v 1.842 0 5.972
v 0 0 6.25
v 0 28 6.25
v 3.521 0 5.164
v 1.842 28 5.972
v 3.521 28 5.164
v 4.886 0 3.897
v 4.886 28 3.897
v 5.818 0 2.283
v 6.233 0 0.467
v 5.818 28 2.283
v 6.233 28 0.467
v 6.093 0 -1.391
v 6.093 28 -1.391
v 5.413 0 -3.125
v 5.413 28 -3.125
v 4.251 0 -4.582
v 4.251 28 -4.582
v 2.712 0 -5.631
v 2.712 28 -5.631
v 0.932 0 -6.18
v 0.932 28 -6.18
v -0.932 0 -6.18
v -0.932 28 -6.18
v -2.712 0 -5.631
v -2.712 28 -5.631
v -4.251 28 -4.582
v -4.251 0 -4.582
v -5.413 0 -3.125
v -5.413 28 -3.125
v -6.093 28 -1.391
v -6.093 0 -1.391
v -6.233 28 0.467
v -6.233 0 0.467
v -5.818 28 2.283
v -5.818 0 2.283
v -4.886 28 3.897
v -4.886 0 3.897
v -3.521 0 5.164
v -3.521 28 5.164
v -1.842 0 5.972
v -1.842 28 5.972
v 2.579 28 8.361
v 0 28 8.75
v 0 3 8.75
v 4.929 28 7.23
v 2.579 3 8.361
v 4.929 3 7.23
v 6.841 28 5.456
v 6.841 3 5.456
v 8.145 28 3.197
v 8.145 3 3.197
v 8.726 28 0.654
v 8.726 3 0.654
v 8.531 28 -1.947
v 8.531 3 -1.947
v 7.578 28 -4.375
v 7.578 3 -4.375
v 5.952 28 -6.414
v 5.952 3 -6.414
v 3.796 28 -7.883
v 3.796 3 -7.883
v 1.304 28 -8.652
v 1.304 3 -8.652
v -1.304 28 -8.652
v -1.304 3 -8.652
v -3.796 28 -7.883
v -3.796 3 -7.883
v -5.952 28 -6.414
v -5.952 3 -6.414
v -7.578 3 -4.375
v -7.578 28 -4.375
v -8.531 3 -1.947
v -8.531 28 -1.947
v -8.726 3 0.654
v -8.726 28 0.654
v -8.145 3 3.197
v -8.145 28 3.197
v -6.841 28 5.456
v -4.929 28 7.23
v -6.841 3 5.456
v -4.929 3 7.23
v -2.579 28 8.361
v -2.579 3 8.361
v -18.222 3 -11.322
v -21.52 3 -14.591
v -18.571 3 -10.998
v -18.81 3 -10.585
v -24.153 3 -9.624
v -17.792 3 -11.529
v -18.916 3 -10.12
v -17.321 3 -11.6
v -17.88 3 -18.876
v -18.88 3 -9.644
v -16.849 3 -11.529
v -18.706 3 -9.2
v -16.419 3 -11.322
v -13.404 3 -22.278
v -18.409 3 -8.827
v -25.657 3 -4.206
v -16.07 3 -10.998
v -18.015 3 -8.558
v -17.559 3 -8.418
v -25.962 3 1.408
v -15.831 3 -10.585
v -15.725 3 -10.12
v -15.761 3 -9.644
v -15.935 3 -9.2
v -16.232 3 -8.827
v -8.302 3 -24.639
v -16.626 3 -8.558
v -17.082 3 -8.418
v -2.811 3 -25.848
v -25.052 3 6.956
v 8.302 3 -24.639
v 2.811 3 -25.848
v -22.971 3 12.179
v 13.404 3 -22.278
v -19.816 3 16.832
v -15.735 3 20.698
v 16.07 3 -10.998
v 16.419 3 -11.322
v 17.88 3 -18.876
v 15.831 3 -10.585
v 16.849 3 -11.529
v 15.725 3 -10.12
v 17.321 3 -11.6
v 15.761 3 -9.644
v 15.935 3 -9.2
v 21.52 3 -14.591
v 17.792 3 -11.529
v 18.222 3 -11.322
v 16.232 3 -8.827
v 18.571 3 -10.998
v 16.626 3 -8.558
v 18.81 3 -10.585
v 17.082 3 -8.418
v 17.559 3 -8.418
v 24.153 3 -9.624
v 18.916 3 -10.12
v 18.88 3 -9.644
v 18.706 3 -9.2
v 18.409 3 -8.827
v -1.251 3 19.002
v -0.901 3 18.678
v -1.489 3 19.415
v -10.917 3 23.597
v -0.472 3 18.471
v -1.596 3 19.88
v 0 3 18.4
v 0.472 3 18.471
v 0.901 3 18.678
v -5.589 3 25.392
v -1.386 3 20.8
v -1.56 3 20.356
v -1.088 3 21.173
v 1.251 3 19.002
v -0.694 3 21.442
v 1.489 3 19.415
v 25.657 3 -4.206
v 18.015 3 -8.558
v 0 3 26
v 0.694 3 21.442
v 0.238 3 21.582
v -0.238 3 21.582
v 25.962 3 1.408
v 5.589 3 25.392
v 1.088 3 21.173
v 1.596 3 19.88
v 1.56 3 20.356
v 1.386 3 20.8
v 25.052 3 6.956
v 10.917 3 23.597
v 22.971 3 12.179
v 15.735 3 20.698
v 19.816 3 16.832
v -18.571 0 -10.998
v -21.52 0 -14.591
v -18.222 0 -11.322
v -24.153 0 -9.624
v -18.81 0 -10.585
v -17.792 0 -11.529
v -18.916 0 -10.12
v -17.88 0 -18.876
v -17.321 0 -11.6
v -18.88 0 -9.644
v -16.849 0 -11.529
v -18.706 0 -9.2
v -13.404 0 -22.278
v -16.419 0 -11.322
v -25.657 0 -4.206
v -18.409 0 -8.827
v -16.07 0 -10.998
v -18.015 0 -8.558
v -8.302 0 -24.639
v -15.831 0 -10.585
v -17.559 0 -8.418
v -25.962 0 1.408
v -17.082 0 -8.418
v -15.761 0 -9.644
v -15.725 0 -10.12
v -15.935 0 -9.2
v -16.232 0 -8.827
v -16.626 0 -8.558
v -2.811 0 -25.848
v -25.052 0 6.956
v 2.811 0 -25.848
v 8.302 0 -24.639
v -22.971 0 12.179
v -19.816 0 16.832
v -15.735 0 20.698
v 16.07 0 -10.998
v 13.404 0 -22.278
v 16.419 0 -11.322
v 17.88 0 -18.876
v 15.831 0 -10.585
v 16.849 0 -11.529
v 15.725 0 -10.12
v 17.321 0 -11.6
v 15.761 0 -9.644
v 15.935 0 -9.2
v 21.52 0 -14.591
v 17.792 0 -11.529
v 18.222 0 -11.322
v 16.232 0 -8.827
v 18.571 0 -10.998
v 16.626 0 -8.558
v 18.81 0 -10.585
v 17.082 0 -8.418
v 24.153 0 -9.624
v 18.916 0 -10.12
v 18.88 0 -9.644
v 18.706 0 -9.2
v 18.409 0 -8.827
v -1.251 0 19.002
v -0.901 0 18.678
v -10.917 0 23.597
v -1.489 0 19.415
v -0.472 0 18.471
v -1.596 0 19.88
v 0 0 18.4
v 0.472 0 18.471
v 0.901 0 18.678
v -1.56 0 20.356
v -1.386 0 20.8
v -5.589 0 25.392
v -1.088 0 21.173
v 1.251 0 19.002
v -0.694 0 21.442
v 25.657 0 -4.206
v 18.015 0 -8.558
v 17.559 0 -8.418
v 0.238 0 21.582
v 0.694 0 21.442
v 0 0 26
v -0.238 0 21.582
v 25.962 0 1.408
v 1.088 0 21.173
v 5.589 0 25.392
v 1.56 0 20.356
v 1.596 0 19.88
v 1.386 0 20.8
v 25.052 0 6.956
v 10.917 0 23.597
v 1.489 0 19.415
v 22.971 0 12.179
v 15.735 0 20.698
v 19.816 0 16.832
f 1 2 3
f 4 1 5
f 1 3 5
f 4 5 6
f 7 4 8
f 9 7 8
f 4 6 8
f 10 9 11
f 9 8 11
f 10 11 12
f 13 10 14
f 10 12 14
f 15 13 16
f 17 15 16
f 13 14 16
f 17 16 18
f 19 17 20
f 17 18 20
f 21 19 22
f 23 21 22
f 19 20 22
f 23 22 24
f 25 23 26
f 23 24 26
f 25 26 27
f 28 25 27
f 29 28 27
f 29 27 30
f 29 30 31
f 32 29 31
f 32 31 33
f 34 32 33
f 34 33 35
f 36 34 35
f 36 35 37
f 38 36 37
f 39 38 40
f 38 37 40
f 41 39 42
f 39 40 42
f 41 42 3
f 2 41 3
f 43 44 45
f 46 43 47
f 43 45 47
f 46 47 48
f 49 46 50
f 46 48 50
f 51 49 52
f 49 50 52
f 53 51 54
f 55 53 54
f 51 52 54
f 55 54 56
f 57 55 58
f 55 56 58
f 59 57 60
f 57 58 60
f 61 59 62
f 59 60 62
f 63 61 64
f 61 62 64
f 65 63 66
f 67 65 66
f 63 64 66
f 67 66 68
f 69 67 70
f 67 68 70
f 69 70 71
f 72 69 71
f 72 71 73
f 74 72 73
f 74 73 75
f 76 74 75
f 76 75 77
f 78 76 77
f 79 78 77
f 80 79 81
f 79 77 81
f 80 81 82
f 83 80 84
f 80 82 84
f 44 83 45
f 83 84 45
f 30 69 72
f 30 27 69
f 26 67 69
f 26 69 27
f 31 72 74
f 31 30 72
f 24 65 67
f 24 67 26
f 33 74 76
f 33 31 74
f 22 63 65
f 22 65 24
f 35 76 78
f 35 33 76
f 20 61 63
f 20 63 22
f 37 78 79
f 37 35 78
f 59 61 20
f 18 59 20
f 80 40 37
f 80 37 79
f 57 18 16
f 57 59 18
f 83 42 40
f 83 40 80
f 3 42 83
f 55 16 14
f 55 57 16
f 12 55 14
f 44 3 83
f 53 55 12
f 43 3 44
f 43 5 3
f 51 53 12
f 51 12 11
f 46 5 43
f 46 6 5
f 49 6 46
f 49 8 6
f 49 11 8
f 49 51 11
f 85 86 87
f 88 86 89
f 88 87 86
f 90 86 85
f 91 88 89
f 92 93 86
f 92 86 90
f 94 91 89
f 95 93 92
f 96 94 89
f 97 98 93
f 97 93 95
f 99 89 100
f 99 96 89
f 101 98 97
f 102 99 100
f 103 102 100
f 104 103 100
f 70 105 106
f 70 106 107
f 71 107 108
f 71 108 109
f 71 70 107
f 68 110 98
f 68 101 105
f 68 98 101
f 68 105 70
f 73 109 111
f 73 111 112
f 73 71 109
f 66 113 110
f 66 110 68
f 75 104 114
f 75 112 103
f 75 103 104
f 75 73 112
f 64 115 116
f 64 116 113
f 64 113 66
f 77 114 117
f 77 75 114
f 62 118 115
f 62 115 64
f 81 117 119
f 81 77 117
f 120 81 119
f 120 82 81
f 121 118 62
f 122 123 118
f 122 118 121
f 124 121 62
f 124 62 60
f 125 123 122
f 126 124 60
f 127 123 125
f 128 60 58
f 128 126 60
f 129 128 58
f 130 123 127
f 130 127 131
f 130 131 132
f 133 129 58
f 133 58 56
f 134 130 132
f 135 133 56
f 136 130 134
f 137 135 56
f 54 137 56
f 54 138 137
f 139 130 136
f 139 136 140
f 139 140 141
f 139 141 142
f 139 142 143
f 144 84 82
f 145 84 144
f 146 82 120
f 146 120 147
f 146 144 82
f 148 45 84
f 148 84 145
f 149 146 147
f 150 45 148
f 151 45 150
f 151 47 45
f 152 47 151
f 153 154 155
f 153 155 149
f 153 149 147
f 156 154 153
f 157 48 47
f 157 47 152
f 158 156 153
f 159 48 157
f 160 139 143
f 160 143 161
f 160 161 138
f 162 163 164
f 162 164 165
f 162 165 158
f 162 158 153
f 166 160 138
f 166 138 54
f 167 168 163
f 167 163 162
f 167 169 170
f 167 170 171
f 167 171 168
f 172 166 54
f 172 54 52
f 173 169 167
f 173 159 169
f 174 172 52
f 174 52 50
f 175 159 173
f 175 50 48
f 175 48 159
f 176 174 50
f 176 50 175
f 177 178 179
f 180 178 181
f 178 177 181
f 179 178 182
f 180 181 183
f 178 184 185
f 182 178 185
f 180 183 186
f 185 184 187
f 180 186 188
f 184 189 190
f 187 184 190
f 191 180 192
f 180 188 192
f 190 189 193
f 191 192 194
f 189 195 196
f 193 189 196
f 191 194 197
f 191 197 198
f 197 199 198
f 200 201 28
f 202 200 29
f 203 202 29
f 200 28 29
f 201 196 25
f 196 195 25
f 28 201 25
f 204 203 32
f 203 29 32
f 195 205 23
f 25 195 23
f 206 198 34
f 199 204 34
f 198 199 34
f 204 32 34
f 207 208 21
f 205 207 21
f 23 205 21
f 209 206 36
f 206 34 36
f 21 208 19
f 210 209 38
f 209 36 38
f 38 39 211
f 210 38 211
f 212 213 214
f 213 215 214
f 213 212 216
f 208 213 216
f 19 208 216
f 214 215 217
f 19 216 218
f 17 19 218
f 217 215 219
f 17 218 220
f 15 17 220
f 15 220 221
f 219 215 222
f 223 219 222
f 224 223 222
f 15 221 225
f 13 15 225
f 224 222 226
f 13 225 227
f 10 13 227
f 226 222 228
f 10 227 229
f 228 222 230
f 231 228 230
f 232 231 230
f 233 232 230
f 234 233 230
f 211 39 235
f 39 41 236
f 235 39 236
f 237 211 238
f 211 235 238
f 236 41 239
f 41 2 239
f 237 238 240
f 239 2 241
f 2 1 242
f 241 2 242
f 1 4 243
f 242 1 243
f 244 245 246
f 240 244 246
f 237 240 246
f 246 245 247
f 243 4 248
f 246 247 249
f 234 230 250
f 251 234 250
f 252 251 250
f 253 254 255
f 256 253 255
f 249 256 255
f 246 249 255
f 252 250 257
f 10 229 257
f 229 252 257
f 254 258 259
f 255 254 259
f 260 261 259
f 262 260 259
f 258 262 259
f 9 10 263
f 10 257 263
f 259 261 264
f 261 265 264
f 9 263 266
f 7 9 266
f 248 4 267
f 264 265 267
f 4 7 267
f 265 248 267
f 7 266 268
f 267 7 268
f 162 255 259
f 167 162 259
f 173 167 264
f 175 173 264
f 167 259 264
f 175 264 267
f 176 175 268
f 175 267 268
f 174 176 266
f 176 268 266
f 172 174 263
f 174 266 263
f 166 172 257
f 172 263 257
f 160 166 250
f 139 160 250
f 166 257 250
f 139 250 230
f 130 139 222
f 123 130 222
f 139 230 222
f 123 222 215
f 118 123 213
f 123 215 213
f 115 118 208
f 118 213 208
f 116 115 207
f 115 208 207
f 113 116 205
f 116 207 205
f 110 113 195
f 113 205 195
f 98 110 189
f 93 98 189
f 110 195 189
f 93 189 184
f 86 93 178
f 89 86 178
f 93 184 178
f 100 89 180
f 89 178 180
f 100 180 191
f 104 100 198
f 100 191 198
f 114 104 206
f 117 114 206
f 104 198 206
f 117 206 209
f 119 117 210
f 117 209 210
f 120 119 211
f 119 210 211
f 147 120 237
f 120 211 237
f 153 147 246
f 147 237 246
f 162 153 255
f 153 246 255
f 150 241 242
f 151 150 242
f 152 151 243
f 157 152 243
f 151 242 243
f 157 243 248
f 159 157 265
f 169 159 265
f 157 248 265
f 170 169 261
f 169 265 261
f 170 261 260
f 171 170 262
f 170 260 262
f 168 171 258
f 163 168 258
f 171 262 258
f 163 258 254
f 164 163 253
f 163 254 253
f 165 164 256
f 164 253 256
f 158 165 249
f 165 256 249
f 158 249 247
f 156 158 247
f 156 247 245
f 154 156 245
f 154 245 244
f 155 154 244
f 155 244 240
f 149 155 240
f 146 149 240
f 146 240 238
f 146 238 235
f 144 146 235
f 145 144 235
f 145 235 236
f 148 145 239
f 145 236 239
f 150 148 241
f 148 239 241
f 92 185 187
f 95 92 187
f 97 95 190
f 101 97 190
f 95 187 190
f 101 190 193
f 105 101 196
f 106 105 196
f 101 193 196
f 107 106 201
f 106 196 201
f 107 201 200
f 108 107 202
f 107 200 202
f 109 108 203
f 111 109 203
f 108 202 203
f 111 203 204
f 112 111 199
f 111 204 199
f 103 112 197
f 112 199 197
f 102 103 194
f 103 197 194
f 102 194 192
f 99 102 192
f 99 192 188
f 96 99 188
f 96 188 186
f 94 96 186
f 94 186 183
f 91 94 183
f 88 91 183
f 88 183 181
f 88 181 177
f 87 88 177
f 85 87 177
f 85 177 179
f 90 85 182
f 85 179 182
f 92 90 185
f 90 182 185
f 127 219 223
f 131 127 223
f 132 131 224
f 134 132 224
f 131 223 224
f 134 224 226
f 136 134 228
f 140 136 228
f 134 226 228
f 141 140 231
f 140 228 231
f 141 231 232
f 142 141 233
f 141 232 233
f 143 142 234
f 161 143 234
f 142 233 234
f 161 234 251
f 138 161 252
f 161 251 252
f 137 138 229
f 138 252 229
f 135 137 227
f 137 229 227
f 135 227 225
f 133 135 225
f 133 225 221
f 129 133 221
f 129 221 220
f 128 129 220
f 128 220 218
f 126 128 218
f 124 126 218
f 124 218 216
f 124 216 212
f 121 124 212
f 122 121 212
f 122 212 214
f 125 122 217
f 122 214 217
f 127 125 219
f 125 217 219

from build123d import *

# Parameters (mm, degrees)
SKETCH_1_R          = 26
EXTRUDE_1_DEPTH     = 3
SKETCH_2_R          = 8.75
EXTRUDE_2_DEPTH     = 25
SKETCH_3_R          = 6.25
CUT_EXTRUDE_1_DEPTH = 28
SKETCH_5_R          = 1.6
CUT_EXTRUDE_3_DEPTH = 3


with BuildPart() as part:
    # 草图1 → 凸台-拉伸1 (new body)
    with BuildSketch(Plane(origin=(0, 0, 0), x_dir=(1, 0, 0), z_dir=(0, 1, 0))):
        with Locations(Location((0, 0, 0), (0, 0, 270))):
            Circle(SKETCH_1_R)
    extrude(amount=EXTRUDE_1_DEPTH)

    # 草图2 → 凸台-拉伸2 (add)
    with BuildSketch(Plane(origin=(0, 3, 0), x_dir=(1, 0, 0), z_dir=(0, 1, 0))):
        with Locations(Location((0, 0, 0), (0, 0, 270))):
            Circle(SKETCH_2_R)
    extrude(amount=EXTRUDE_2_DEPTH)

    # 草图3 → 切除-拉伸1 (cut)
    with BuildSketch(Plane(origin=(0, 28, 0), x_dir=(1, 0, 0), z_dir=(0, 1, 0))):
        with Locations(Location((0, 0, 0), (0, 0, 270))):
            Circle(SKETCH_3_R)
    extrude(amount=-CUT_EXTRUDE_1_DEPTH, mode=Mode.SUBTRACT)

    # 草图5 → 切除-拉伸3 (cut)
    with BuildSketch(Plane.XZ):
        with Locations(Location((0, 20, 0), (0, 0, 270))):
            Circle(SKETCH_5_R)
        with Locations(Location((17.320508076, -10, 0), (0, 0, 270))):
            Circle(SKETCH_5_R)
        with Locations(Location((-17.320508076, -10, 0), (0, 0, 270))):
            Circle(SKETCH_5_R)
    extrude(amount=-CUT_EXTRUDE_3_DEPTH, mode=Mode.SUBTRACT)


solid = part.part
